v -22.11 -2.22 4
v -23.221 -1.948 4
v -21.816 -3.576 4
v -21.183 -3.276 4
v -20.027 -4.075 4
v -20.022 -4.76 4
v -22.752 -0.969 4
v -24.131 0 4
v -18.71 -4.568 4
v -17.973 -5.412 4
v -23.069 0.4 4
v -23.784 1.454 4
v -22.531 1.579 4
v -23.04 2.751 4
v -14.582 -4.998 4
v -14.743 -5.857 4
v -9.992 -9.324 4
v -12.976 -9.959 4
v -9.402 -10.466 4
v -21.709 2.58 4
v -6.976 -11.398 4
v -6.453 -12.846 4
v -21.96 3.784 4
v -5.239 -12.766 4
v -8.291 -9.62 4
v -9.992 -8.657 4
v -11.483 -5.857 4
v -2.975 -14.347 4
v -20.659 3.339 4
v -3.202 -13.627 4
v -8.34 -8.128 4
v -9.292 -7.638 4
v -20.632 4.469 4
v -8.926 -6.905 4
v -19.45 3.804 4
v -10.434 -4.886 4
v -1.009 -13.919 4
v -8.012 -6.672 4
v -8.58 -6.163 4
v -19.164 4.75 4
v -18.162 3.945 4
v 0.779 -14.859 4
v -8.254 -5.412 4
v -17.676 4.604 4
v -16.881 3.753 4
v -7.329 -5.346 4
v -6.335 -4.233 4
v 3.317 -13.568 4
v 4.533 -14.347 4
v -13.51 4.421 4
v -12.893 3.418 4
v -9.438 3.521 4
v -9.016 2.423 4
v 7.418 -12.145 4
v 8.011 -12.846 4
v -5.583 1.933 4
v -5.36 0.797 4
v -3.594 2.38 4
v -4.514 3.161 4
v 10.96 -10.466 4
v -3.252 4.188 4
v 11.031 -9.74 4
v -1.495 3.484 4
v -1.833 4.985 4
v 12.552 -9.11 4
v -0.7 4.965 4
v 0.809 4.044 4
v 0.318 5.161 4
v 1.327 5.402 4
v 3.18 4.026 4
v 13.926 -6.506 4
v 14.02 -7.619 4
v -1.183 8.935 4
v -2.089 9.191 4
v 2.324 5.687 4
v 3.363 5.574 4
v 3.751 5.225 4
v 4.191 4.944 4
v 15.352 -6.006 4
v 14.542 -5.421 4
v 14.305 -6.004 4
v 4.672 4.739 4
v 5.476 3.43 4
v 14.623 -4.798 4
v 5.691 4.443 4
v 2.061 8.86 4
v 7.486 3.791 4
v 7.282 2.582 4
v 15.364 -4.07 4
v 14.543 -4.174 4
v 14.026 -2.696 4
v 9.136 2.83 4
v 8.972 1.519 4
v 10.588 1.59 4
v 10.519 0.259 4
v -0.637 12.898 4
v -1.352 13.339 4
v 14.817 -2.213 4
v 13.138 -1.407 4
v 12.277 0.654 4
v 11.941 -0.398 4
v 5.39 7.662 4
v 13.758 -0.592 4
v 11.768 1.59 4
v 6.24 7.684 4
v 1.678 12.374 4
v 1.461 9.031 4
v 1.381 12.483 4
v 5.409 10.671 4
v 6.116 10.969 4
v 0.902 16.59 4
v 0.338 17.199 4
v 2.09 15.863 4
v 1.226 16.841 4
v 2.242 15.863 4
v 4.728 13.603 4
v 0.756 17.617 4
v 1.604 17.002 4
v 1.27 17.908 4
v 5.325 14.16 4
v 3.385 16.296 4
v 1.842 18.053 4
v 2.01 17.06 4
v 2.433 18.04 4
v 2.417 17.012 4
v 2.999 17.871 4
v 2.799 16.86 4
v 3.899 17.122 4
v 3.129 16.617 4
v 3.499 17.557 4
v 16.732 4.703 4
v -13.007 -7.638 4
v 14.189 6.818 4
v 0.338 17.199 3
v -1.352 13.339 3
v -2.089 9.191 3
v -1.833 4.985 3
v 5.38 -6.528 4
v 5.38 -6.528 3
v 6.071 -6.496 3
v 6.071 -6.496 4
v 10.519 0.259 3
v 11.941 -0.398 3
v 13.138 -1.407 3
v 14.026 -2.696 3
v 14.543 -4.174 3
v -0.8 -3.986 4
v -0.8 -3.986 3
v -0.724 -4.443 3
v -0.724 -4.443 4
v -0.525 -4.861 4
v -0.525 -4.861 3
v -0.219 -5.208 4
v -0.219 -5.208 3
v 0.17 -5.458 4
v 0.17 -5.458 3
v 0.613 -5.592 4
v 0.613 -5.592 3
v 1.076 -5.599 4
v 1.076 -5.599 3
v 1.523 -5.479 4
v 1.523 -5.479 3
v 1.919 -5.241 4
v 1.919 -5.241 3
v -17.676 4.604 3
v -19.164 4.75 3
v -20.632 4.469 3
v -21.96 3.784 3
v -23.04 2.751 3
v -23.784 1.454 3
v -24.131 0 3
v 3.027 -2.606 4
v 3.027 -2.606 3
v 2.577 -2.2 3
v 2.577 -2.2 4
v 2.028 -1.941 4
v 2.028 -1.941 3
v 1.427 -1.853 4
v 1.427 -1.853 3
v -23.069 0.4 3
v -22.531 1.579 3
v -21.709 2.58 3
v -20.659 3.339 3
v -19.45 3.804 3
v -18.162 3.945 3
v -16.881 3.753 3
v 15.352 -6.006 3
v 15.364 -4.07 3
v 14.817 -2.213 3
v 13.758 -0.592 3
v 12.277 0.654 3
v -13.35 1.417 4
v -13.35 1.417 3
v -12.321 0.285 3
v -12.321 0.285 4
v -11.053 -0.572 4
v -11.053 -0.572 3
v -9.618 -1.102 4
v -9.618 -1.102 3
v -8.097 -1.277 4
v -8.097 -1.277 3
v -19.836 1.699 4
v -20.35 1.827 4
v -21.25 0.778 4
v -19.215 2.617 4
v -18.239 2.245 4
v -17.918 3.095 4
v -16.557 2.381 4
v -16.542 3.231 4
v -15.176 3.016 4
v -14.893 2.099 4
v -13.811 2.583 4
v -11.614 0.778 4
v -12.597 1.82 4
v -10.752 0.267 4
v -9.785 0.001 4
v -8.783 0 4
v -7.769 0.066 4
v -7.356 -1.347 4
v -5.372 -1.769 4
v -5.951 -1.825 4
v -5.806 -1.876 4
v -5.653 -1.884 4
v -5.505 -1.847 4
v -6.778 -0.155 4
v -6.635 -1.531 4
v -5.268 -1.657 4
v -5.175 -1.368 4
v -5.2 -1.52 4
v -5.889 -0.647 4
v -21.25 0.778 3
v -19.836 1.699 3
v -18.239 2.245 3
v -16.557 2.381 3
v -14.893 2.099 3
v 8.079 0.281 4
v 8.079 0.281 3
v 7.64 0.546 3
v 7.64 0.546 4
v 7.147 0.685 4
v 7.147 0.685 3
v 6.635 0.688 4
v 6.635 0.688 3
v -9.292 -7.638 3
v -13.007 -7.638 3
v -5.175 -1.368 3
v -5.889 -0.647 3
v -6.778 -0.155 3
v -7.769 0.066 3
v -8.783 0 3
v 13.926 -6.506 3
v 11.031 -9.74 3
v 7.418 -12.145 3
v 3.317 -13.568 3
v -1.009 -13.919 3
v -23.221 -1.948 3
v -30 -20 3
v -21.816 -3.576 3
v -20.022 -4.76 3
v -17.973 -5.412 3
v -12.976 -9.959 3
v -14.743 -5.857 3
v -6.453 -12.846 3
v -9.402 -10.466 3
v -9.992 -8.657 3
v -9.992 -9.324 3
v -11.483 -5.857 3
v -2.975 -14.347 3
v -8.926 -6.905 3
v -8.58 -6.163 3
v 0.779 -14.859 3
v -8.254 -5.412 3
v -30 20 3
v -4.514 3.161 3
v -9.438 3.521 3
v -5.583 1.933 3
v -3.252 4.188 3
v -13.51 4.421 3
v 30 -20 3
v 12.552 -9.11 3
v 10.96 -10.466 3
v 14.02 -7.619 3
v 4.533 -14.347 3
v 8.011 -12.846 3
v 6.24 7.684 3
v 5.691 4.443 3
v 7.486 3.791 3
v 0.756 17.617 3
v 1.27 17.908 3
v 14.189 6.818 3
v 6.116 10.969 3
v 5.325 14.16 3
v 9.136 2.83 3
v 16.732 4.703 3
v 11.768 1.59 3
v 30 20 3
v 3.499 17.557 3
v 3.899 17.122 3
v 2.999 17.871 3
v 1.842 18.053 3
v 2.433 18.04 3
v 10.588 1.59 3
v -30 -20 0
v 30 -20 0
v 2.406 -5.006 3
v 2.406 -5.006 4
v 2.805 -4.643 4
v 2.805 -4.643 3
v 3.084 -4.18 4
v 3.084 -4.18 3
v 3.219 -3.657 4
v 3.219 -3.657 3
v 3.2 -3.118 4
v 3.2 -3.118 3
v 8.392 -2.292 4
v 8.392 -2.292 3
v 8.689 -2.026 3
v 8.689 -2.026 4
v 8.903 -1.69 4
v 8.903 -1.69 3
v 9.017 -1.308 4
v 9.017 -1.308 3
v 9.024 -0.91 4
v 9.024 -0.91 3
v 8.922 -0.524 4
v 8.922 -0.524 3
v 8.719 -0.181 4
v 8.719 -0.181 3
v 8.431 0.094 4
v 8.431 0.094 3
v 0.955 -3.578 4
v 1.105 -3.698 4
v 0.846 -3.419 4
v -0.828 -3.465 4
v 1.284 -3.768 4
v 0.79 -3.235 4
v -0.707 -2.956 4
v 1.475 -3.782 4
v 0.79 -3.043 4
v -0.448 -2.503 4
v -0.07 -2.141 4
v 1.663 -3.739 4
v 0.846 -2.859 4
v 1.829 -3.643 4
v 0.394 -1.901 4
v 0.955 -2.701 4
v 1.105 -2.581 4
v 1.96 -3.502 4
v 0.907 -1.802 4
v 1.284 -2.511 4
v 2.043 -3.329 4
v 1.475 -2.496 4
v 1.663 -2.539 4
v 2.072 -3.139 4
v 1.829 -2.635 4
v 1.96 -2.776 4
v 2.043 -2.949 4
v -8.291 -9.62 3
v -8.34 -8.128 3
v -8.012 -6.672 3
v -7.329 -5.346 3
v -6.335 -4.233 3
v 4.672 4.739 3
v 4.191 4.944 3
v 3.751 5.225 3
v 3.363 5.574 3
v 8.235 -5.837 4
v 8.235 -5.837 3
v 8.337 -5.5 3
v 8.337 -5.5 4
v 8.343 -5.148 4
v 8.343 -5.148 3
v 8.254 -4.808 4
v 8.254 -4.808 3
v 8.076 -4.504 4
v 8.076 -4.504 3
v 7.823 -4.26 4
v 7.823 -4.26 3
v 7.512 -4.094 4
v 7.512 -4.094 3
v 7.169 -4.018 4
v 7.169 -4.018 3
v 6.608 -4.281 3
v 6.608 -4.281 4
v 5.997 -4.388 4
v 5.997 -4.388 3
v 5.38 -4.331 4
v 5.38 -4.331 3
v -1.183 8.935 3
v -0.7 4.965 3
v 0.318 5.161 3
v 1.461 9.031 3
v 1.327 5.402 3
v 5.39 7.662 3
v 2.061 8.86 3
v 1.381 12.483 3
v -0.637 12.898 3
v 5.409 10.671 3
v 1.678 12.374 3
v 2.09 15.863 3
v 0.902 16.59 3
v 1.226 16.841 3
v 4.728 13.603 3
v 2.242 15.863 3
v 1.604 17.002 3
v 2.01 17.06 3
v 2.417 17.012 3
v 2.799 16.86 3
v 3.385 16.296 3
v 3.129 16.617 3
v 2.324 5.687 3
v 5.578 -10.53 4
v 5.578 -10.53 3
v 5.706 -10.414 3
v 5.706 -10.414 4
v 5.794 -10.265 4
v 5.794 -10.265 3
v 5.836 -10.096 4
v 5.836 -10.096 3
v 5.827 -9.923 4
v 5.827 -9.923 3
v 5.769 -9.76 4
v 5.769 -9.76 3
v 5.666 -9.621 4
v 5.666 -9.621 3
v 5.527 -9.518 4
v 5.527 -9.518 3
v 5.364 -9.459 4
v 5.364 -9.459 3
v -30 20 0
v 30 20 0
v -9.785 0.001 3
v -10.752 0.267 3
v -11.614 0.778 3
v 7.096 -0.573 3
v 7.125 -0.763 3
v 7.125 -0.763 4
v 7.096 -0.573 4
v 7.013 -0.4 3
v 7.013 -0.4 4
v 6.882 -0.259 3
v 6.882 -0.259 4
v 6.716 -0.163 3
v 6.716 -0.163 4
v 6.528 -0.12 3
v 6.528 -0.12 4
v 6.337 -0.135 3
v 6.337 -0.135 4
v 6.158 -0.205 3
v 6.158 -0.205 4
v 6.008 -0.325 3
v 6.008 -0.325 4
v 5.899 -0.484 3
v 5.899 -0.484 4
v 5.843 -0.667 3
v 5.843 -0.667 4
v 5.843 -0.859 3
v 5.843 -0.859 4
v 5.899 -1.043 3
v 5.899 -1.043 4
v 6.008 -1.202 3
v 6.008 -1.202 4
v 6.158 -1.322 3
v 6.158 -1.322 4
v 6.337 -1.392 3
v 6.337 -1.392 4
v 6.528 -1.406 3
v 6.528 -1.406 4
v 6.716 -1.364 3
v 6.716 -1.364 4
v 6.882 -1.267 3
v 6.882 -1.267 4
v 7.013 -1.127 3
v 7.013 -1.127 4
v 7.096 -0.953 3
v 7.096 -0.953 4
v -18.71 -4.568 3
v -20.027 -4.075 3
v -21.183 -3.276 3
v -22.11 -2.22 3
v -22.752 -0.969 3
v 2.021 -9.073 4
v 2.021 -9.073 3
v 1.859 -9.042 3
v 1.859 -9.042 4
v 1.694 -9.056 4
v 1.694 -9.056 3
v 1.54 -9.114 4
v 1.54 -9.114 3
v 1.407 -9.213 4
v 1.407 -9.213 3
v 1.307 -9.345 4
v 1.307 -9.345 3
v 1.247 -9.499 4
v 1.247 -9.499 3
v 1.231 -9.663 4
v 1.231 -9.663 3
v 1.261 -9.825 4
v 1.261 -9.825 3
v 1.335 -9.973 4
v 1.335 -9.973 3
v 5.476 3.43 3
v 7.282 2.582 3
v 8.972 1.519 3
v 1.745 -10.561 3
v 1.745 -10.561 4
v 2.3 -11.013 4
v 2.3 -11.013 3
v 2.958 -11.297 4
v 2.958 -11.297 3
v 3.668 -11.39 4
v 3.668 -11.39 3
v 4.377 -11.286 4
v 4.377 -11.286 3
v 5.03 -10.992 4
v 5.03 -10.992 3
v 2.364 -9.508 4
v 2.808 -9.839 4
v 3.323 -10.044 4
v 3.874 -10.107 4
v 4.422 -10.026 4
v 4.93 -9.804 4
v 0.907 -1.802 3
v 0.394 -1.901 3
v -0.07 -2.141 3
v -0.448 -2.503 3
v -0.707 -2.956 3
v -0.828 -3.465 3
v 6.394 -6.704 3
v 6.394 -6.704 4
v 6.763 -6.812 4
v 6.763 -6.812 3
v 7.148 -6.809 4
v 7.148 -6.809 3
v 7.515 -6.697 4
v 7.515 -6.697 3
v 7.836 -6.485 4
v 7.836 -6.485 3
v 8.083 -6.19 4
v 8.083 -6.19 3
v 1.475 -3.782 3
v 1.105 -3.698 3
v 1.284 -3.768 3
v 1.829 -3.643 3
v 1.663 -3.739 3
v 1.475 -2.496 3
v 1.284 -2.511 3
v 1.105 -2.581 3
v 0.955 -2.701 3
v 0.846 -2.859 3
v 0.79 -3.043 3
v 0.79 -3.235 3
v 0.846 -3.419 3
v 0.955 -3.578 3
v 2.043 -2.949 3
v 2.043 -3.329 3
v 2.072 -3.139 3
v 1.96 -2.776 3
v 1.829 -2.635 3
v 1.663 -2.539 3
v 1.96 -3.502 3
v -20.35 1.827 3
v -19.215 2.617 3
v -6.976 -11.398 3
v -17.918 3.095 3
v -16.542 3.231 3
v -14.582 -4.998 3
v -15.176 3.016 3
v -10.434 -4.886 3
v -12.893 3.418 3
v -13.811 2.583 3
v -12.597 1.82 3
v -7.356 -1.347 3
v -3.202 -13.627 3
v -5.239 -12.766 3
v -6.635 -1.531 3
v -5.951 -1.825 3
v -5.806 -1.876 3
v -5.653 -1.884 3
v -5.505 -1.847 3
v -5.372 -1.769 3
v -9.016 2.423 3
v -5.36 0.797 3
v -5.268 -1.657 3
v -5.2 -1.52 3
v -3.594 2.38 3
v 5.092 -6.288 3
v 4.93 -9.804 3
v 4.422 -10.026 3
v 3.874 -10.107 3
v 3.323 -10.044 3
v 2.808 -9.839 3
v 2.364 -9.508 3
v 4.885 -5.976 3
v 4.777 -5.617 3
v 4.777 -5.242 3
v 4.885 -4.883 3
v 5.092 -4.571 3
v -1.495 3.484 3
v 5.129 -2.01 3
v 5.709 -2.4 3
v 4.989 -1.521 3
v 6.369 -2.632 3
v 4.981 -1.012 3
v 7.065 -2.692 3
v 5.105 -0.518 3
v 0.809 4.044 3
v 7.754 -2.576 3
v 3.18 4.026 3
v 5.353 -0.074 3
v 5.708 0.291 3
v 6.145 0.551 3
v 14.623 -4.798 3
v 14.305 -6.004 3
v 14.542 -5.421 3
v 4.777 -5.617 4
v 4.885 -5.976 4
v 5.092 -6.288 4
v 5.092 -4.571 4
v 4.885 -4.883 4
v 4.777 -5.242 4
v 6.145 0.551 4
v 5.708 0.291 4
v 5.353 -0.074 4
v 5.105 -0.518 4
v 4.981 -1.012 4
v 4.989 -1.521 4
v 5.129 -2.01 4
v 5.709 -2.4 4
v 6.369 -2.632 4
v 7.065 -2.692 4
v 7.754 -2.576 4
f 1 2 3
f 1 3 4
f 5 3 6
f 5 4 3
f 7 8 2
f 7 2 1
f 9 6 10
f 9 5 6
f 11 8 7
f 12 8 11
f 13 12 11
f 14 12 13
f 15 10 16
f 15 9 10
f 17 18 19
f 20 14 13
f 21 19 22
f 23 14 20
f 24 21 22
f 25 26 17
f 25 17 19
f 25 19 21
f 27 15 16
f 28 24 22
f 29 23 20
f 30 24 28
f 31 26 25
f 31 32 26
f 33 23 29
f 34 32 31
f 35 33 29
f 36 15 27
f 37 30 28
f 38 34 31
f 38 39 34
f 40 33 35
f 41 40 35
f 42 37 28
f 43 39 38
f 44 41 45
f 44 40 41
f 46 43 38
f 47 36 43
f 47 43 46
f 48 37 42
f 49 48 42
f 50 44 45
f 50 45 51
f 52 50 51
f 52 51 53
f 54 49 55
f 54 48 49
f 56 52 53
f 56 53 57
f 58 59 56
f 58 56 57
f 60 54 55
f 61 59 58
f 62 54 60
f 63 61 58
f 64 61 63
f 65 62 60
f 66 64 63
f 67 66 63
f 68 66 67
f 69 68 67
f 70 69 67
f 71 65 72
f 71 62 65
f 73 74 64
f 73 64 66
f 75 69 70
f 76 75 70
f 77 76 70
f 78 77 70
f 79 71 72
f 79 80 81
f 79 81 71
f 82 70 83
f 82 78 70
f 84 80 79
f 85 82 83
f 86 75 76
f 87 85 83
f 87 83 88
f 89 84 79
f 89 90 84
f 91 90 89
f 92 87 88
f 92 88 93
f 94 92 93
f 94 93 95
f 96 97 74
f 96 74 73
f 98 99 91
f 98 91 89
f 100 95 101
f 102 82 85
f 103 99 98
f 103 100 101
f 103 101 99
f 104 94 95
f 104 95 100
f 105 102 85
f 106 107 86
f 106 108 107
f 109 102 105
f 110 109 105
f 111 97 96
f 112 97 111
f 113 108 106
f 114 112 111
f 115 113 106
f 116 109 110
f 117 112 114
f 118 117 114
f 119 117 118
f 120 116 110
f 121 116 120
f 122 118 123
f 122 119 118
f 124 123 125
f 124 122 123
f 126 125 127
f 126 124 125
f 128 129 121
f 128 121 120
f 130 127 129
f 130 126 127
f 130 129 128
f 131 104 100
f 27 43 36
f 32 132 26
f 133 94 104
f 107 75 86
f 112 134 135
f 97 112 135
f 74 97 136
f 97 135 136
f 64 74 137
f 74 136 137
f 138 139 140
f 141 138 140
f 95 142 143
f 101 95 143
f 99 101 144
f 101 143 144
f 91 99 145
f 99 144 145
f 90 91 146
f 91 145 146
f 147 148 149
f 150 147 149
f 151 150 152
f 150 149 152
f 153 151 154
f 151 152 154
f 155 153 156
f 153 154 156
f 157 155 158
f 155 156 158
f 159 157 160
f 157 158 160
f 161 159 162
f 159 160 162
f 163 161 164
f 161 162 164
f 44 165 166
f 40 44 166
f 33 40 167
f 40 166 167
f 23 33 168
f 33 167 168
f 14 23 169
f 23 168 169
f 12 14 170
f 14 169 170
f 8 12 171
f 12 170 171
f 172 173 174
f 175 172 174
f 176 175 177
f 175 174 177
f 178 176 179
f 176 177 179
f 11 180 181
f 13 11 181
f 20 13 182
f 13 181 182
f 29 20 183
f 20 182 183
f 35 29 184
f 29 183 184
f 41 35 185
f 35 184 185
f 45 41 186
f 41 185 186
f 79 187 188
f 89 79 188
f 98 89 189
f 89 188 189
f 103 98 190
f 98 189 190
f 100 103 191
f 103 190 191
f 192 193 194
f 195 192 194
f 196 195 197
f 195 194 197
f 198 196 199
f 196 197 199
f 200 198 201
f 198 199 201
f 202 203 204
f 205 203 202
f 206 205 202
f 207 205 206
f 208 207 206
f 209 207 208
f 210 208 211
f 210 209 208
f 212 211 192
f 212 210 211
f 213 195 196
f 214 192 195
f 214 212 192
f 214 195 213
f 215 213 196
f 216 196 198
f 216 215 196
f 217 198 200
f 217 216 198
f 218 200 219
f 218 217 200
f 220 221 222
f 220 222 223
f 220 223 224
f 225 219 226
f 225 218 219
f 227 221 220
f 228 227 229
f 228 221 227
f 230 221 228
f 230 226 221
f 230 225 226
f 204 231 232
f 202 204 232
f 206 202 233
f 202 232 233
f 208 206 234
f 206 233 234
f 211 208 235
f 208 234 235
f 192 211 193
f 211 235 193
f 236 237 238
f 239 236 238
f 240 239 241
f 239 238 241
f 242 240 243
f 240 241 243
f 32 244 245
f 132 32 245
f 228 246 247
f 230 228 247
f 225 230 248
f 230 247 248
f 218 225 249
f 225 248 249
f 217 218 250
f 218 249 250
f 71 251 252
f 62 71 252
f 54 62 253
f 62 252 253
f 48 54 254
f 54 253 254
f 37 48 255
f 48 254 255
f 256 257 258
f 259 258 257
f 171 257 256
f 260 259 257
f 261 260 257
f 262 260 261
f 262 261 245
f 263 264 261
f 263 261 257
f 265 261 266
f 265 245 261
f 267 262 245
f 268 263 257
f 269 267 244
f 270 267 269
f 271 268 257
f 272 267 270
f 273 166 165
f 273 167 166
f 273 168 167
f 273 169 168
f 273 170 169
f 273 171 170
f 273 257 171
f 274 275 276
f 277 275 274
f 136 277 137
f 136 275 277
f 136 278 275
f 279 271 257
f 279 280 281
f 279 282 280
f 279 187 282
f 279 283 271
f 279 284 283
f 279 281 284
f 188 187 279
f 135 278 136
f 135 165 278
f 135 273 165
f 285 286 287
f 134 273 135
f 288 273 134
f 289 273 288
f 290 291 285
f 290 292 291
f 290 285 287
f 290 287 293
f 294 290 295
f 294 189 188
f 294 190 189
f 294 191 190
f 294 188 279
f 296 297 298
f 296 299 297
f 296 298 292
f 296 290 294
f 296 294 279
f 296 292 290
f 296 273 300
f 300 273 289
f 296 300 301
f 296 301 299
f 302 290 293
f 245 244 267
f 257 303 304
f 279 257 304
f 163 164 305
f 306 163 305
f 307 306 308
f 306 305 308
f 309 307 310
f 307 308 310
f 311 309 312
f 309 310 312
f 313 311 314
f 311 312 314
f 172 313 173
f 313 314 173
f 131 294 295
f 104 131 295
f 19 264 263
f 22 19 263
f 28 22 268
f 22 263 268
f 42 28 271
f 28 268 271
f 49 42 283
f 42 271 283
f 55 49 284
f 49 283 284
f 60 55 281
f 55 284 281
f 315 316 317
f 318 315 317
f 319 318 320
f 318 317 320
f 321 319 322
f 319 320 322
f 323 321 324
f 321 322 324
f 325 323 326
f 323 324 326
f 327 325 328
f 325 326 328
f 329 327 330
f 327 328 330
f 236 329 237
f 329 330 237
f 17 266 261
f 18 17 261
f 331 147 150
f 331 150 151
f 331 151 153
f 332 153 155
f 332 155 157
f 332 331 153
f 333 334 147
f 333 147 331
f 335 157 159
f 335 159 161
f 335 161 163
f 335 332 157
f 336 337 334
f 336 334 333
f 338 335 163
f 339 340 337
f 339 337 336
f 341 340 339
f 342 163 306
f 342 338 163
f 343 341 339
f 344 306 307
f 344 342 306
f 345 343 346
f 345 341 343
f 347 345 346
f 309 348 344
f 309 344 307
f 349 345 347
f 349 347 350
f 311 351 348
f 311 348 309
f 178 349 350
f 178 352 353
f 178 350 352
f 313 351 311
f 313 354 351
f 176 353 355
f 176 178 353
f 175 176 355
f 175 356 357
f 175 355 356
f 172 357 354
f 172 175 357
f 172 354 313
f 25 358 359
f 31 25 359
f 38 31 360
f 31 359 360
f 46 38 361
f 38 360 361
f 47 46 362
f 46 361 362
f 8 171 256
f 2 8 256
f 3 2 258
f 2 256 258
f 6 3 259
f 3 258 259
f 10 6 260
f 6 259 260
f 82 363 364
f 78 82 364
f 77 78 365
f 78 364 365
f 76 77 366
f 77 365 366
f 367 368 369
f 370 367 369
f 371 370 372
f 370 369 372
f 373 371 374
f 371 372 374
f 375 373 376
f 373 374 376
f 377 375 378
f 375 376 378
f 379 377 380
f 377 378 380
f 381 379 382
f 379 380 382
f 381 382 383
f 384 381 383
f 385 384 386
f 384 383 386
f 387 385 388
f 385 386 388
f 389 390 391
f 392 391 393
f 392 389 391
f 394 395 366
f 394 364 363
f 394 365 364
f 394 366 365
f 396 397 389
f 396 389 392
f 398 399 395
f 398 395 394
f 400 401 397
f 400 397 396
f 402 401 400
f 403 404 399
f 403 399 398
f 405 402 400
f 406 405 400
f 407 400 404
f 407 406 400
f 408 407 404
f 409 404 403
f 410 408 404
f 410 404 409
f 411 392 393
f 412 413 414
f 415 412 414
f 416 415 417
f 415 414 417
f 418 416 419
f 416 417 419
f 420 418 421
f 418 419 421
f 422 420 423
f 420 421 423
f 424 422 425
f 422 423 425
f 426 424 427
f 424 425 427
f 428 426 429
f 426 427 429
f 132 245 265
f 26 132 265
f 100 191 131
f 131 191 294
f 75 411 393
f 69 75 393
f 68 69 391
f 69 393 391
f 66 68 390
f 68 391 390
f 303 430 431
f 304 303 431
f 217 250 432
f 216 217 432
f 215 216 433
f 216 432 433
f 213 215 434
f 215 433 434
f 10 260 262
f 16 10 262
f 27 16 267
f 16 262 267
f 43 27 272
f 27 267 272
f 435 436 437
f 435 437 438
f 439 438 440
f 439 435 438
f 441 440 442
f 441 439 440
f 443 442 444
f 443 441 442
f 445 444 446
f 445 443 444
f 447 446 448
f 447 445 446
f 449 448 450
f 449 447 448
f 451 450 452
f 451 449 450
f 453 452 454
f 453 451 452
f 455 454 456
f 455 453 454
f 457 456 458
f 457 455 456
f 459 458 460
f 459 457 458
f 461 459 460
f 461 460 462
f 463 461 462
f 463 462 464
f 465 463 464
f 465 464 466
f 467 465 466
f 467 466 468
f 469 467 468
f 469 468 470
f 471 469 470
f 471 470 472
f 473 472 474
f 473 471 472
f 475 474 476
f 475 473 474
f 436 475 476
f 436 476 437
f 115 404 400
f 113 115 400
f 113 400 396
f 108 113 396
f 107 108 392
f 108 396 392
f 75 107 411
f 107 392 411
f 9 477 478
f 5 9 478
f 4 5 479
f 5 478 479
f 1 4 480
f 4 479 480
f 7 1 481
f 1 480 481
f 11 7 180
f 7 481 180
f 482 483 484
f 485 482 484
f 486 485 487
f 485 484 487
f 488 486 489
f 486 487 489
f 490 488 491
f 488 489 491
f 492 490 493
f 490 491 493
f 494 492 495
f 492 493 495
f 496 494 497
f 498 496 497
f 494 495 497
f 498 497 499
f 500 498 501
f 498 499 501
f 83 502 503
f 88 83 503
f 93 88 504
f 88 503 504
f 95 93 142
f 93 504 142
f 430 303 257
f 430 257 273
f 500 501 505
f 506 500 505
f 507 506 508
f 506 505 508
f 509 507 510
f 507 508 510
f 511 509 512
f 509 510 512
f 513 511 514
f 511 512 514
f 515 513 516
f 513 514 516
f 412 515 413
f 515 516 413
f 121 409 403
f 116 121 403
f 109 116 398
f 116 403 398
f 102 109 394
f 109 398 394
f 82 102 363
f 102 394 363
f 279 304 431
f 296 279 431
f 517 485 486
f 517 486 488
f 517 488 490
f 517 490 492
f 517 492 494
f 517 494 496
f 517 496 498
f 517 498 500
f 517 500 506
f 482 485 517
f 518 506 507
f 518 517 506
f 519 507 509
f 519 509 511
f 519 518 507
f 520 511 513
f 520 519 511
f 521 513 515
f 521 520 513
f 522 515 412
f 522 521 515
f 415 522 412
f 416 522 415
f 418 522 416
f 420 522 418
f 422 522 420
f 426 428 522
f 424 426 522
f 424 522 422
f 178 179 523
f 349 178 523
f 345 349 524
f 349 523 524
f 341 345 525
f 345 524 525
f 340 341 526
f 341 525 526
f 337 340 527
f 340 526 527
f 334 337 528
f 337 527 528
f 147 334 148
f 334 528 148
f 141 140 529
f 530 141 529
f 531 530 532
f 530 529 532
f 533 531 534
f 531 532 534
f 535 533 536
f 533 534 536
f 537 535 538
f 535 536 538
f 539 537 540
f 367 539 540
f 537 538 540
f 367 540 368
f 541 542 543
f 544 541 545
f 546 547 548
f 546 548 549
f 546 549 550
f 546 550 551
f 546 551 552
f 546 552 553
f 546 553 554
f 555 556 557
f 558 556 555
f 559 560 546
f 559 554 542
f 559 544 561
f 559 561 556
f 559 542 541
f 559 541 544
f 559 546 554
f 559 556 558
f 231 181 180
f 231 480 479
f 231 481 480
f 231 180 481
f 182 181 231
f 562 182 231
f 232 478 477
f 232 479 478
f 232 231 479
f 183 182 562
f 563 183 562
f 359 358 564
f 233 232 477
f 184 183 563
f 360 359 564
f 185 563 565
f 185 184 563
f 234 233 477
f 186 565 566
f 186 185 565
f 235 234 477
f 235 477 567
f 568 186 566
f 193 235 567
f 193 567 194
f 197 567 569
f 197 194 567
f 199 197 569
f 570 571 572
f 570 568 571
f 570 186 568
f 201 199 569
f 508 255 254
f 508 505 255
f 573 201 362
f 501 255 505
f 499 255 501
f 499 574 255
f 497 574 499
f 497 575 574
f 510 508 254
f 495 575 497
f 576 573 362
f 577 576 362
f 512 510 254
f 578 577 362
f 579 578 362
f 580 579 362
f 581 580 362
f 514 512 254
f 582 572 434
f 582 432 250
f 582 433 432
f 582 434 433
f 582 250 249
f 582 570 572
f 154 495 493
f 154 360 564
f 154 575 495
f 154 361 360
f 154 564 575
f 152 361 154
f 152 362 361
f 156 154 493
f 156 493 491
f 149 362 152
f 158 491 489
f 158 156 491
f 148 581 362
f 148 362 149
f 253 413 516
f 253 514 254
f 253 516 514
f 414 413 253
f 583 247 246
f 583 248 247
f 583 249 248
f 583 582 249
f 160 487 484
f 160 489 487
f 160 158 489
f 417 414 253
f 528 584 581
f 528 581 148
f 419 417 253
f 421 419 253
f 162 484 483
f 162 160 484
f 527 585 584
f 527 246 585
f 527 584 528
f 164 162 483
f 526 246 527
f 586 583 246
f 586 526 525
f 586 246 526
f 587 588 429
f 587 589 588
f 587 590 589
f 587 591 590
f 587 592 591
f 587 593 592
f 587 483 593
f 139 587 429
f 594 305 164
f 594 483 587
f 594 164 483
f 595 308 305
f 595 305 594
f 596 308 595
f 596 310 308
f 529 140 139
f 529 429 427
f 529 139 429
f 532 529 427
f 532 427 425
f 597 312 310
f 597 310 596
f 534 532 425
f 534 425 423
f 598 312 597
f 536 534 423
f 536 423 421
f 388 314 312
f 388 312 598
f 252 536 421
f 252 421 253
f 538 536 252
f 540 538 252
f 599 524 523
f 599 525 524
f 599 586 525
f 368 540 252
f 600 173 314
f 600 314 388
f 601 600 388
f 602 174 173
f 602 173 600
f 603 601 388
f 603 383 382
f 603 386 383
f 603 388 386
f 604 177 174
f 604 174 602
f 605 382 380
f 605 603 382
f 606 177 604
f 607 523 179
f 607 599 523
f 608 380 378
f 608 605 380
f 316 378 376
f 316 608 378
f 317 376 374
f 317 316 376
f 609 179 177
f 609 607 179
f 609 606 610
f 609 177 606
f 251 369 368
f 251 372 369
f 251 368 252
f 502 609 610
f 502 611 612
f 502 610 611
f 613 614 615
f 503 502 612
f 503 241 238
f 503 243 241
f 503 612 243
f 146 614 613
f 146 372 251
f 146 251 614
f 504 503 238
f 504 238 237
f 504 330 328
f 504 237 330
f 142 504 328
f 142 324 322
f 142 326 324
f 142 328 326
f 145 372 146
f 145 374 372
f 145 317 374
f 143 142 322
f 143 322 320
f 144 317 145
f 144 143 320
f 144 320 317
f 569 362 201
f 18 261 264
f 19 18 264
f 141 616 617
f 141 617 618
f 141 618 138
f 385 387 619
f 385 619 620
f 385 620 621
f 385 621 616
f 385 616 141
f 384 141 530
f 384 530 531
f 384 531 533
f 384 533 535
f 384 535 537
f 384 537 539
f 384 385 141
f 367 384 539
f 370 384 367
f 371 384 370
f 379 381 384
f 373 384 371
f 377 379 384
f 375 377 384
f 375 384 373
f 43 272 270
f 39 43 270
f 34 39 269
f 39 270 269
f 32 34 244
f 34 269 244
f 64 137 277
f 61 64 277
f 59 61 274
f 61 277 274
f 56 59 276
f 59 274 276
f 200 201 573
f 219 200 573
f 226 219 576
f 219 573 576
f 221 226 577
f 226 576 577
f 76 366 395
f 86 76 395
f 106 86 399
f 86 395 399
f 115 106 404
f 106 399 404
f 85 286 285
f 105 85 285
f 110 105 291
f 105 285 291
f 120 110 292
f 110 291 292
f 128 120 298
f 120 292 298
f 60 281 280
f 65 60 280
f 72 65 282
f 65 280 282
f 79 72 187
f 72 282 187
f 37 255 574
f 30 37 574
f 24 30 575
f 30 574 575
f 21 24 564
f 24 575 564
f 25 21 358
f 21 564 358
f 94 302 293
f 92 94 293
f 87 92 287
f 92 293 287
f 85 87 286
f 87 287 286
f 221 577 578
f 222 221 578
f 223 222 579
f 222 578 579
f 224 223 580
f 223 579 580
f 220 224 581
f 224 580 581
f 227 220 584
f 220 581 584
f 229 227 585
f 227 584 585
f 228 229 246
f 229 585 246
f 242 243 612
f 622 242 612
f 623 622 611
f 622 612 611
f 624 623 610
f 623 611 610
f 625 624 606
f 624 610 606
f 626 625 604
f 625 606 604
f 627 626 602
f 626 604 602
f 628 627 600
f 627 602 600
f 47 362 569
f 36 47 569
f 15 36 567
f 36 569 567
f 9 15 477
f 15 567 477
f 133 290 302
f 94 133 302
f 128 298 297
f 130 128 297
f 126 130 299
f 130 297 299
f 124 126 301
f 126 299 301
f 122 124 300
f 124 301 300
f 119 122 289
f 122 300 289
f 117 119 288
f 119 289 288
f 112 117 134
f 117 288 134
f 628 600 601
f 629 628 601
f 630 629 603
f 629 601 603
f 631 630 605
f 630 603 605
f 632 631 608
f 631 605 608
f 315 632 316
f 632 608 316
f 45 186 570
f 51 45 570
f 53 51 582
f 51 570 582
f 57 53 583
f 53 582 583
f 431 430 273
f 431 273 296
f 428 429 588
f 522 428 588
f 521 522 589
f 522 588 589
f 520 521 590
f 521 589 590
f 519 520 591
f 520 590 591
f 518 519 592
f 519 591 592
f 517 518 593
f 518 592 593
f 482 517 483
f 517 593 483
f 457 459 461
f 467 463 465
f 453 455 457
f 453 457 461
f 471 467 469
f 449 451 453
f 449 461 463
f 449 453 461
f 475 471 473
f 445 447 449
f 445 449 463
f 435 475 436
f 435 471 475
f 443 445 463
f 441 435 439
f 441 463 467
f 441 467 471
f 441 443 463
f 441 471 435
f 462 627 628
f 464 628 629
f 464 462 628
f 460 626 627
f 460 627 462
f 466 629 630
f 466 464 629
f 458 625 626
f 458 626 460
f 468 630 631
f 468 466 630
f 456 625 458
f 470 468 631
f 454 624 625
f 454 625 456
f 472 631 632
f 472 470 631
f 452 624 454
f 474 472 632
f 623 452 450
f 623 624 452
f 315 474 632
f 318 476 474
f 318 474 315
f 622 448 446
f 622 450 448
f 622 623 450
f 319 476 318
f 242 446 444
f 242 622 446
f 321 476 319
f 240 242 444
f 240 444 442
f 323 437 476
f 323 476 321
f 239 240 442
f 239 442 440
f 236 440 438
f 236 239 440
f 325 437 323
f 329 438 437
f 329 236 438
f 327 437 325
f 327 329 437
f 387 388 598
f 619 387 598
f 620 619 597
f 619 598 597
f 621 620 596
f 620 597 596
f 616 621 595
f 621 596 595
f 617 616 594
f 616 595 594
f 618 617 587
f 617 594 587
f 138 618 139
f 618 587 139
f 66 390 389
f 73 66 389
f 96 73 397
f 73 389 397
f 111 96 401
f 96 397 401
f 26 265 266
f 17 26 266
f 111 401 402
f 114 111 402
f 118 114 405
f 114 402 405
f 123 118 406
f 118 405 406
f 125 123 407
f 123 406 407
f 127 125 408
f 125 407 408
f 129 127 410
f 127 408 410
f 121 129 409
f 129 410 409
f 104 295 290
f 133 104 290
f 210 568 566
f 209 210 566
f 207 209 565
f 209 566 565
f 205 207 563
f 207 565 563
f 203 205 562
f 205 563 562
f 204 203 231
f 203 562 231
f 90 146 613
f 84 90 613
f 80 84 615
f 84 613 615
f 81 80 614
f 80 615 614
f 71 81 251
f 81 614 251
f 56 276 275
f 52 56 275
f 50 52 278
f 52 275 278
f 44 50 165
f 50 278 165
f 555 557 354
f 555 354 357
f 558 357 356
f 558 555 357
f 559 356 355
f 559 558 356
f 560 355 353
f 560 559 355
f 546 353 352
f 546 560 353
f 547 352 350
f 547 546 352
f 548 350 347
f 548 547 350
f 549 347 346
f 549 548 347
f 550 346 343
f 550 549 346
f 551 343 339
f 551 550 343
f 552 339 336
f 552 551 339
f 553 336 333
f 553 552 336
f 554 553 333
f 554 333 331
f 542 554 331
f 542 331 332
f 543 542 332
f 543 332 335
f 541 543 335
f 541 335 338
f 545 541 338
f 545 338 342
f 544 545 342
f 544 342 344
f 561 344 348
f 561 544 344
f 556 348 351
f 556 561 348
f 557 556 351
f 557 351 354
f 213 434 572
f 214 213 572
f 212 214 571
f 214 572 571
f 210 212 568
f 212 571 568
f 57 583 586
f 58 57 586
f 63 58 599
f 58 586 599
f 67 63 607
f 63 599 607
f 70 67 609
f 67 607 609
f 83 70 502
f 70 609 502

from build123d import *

# Parameters (mm, degrees)
F0_W     = 60
F0_H     = 40
F1_DEPTH = 3
F2_R     = 0.644788
F3_DEPTH = 1


with BuildPart() as f1:
    # F0 (on Top) → F1 (new body)
    with BuildSketch(Plane.XY):
        Rectangle(F0_W, F0_H)
    extrude(amount=F1_DEPTH)

    # F2 (on face) → F3 (join)
    with BuildSketch(Plane.XY.offset(3)):
        with BuildLine():
            ThreePointArc((-1.83289, 4.985239), (-3.905066, 3.701445), (-5.582823, 1.933065))
            ThreePointArc((-5.582823, 1.933065), (-11.454748, 4.059319), (-17.675988, 4.603948))
            ThreePointArc((-17.675988, 4.603948), (-21.960088, 3.783559), (-24.130624, 0))
            ThreePointArc((-24.130624, 0), (-21.816485, -3.576152), (-17.972754, -5.411863))
            ThreePointArc((-17.972754, -5.411863), (-13.11323, -5.912843), (-8.253707, -5.411863))
            ThreePointArc((-8.253707, -5.411863), (-8.750343, -6.535326), (-9.292384, -7.637599))
            Line((-9.292384, -7.637599), (-13.007432, -7.637599))
            Line((-13.007432, -7.637599), (-9.992245, -8.657275))
            Line((-9.992245, -8.657275), (-9.992245, -9.32379))
            Line((-9.992245, -9.32379), (-12.975693, -9.958565))
            Line((-12.975693, -9.958565), (-9.40157, -10.466387))
            ThreePointArc((-9.40157, -10.466387), (0.779134, -14.859459), (10.959839, -10.466387))
            ThreePointArc((10.959839, -10.466387), (13.302708, -8.380835), (15.35197, -6.006159))
            ThreePointArc((15.35197, -6.006159), (14.817038, -2.212991), (12.276846, 0.65436))
            Line((12.276846, 0.65436), (16.732113, 4.702753))
            Line((16.732113, 4.702753), (11.768254, 1.590169))
            Line((11.768254, 1.590169), (14.189153, 6.818497))
            Line((14.189153, 6.818497), (10.58832, 1.590169))
            ThreePointArc((10.58832, 1.590169), (8.332541, 3.347539), (5.691082, 4.442793))
            ThreePointArc((5.691082, 4.442793), (6.116375, 10.969097), (3.898917, 17.121852))
            ThreePointArc((3.898917, 17.121852), (2.138019, 18.066027), (0.337851, 17.199064))
            ThreePointArc((0.337851, 17.199064), (-1.843688, 11.286972), (-1.83289, 4.985239))
        make_face()
        with BuildLine():
            ThreePointArc((-16.881408, 3.753243), (-10.934, 3.001613), (-5.359556, 0.796576))
            ThreePointArc((-5.359556, 0.796576), (-0.360554, 3.835426), (5.475548, 3.429784))
            ThreePointArc((5.475548, 3.429784), (8.143257, 2.076287), (10.519474, 0.259086))
            ThreePointArc((10.519474, 0.259086), (13.137989, -1.406759), (14.542523, -4.174239))
            ThreePointArc((14.542523, -4.174239), (14.542426, -5.421421), (13.926209, -6.505736))
            ThreePointArc((13.926209, -6.505736), (7.417681, -12.145032), (-1.009353, -13.919206))
            ThreePointArc((-1.009353, -13.919206), (-5.238705, -12.765816), (-8.291389, -9.619573))
            ThreePointArc((-8.291389, -9.619573), (-8.012131, -6.67233), (-6.334951, -4.232804))
            ThreePointArc((-6.334951, -4.232804), (-12.5061, -5.009925), (-18.710274, -4.568096))
            ThreePointArc((-18.710274, -4.568096), (-21.679234, -2.77657), (-23.069071, 0.400322))
            ThreePointArc((-23.069071, 0.400322), (-20.659117, 3.338847), (-16.881408, 3.753243))
        make_face(mode=Mode.SUBTRACT)
        with BuildLine():
            ThreePointArc((3.385171, 16.296154), (5.408767, 10.671196), (4.671817, 4.738912))
            ThreePointArc((4.671817, 4.738912), (3.965382, 5.075268), (3.362598, 5.574104))
            ThreePointArc((3.362598, 5.574104), (1.751569, 10.604004), (2.241873, 15.862798))
            Line((2.241873, 15.862798), (2.090248, 15.862798))
            ThreePointArc((2.090248, 15.862798), (1.321883, 10.754523), (2.324252, 5.686968))
            ThreePointArc((2.324252, 5.686968), (0.823876, 5.275564), (-0.700495, 4.96464))
            ThreePointArc((-0.700495, 4.96464), (-1.037753, 10.93409), (0.90217, 16.589599))
            ThreePointArc((0.90217, 16.589599), (2.215281, 17.048816), (3.385171, 16.296154))
        make_face(mode=Mode.SUBTRACT)
        with BuildLine():
            ThreePointArc((3.027315, -2.605882), (2.311567, -2.050264), (1.427228, -1.8529))
            ThreePointArc((1.427228, -1.8529), (-0.272035, -2.308318), (-0.800345, -3.98635))
            ThreePointArc((-0.800345, -3.98635), (0.170039, -5.458062), (1.919497, -5.24132))
            ThreePointArc((1.919497, -5.24132), (3.083669, -4.180128), (3.027315, -2.605882))
        make_face()
        with Locations((1.427228, -3.139245)):
            Circle(F2_R, mode=Mode.SUBTRACT)
        with BuildLine():
            ThreePointArc((8.07857, 0.280549), (7.398587, 0.631767), (6.635354, 0.688415))
            ThreePointArc((6.635354, 0.688415), (5.214115, -0.287698), (5.12939, -2.009772))
            ThreePointArc((5.12939, -2.009772), (6.714717, -2.684062), (8.392313, -2.29214))
            ThreePointArc((8.392313, -2.29214), (9.02358, -0.909681), (8.07857, 0.280549))
        make_face()
        with Locations((6.480221, -0.763344)):
            Circle(F2_R, mode=Mode.SUBTRACT)
        with BuildLine():
            ThreePointArc((7.168717, -4.017724), (6.306207, -4.355034), (5.380385, -4.331466))
            ThreePointArc((5.380385, -4.331466), (4.763195, -5.429565), (5.380385, -6.527665))
            Line((5.380385, -6.527665), (6.070618, -6.49629))
            ThreePointArc((6.070618, -6.49629), (7.335615, -6.766785), (8.235442, -5.837431))
            ThreePointArc((8.235442, -5.837431), (8.175536, -4.650034), (7.168717, -4.017724))
        make_face()
        with BuildLine():
            ThreePointArc((5.363596, -9.458974), (3.596654, -10.093438), (2.020633, -9.073249))
            ThreePointArc((2.020633, -9.073249), (1.352594, -9.275514), (1.334897, -9.973277))
            ThreePointArc((1.334897, -9.973277), (3.309765, -11.368484), (5.577887, -10.530437))
            ThreePointArc((5.577887, -10.530437), (5.827257, -9.923403), (5.363596, -9.458974))
        make_face()
        with BuildLine():
            ThreePointArc((-21.25046, 0.778031), (-17.402552, 2.364946), (-13.349544, 1.417411))
            ThreePointArc((-13.349544, 1.417411), (-11.052781, -0.571642), (-8.097489, -1.277121))
            ThreePointArc((-8.097489, -1.277121), (-6.992115, -1.425307), (-5.950998, -1.825162))
            ThreePointArc((-5.950998, -1.825162), (-5.435611, -1.813036), (-5.174607, -1.368461))
            ThreePointArc((-5.174607, -1.368461), (-6.777898, -0.155153), (-8.78254, 0))
            ThreePointArc((-8.78254, 0), (-10.277191, 0.101942), (-11.614082, 0.778031))
            ThreePointArc((-11.614082, 0.778031), (-13.17973, 2.239961), (-15.176346, 3.015862))
            ThreePointArc((-15.176346, 3.015862), (-18.581793, 2.896863), (-21.25046, 0.778031))
        make_face()
    extrude(amount=F3_DEPTH)


solid = f1.part
